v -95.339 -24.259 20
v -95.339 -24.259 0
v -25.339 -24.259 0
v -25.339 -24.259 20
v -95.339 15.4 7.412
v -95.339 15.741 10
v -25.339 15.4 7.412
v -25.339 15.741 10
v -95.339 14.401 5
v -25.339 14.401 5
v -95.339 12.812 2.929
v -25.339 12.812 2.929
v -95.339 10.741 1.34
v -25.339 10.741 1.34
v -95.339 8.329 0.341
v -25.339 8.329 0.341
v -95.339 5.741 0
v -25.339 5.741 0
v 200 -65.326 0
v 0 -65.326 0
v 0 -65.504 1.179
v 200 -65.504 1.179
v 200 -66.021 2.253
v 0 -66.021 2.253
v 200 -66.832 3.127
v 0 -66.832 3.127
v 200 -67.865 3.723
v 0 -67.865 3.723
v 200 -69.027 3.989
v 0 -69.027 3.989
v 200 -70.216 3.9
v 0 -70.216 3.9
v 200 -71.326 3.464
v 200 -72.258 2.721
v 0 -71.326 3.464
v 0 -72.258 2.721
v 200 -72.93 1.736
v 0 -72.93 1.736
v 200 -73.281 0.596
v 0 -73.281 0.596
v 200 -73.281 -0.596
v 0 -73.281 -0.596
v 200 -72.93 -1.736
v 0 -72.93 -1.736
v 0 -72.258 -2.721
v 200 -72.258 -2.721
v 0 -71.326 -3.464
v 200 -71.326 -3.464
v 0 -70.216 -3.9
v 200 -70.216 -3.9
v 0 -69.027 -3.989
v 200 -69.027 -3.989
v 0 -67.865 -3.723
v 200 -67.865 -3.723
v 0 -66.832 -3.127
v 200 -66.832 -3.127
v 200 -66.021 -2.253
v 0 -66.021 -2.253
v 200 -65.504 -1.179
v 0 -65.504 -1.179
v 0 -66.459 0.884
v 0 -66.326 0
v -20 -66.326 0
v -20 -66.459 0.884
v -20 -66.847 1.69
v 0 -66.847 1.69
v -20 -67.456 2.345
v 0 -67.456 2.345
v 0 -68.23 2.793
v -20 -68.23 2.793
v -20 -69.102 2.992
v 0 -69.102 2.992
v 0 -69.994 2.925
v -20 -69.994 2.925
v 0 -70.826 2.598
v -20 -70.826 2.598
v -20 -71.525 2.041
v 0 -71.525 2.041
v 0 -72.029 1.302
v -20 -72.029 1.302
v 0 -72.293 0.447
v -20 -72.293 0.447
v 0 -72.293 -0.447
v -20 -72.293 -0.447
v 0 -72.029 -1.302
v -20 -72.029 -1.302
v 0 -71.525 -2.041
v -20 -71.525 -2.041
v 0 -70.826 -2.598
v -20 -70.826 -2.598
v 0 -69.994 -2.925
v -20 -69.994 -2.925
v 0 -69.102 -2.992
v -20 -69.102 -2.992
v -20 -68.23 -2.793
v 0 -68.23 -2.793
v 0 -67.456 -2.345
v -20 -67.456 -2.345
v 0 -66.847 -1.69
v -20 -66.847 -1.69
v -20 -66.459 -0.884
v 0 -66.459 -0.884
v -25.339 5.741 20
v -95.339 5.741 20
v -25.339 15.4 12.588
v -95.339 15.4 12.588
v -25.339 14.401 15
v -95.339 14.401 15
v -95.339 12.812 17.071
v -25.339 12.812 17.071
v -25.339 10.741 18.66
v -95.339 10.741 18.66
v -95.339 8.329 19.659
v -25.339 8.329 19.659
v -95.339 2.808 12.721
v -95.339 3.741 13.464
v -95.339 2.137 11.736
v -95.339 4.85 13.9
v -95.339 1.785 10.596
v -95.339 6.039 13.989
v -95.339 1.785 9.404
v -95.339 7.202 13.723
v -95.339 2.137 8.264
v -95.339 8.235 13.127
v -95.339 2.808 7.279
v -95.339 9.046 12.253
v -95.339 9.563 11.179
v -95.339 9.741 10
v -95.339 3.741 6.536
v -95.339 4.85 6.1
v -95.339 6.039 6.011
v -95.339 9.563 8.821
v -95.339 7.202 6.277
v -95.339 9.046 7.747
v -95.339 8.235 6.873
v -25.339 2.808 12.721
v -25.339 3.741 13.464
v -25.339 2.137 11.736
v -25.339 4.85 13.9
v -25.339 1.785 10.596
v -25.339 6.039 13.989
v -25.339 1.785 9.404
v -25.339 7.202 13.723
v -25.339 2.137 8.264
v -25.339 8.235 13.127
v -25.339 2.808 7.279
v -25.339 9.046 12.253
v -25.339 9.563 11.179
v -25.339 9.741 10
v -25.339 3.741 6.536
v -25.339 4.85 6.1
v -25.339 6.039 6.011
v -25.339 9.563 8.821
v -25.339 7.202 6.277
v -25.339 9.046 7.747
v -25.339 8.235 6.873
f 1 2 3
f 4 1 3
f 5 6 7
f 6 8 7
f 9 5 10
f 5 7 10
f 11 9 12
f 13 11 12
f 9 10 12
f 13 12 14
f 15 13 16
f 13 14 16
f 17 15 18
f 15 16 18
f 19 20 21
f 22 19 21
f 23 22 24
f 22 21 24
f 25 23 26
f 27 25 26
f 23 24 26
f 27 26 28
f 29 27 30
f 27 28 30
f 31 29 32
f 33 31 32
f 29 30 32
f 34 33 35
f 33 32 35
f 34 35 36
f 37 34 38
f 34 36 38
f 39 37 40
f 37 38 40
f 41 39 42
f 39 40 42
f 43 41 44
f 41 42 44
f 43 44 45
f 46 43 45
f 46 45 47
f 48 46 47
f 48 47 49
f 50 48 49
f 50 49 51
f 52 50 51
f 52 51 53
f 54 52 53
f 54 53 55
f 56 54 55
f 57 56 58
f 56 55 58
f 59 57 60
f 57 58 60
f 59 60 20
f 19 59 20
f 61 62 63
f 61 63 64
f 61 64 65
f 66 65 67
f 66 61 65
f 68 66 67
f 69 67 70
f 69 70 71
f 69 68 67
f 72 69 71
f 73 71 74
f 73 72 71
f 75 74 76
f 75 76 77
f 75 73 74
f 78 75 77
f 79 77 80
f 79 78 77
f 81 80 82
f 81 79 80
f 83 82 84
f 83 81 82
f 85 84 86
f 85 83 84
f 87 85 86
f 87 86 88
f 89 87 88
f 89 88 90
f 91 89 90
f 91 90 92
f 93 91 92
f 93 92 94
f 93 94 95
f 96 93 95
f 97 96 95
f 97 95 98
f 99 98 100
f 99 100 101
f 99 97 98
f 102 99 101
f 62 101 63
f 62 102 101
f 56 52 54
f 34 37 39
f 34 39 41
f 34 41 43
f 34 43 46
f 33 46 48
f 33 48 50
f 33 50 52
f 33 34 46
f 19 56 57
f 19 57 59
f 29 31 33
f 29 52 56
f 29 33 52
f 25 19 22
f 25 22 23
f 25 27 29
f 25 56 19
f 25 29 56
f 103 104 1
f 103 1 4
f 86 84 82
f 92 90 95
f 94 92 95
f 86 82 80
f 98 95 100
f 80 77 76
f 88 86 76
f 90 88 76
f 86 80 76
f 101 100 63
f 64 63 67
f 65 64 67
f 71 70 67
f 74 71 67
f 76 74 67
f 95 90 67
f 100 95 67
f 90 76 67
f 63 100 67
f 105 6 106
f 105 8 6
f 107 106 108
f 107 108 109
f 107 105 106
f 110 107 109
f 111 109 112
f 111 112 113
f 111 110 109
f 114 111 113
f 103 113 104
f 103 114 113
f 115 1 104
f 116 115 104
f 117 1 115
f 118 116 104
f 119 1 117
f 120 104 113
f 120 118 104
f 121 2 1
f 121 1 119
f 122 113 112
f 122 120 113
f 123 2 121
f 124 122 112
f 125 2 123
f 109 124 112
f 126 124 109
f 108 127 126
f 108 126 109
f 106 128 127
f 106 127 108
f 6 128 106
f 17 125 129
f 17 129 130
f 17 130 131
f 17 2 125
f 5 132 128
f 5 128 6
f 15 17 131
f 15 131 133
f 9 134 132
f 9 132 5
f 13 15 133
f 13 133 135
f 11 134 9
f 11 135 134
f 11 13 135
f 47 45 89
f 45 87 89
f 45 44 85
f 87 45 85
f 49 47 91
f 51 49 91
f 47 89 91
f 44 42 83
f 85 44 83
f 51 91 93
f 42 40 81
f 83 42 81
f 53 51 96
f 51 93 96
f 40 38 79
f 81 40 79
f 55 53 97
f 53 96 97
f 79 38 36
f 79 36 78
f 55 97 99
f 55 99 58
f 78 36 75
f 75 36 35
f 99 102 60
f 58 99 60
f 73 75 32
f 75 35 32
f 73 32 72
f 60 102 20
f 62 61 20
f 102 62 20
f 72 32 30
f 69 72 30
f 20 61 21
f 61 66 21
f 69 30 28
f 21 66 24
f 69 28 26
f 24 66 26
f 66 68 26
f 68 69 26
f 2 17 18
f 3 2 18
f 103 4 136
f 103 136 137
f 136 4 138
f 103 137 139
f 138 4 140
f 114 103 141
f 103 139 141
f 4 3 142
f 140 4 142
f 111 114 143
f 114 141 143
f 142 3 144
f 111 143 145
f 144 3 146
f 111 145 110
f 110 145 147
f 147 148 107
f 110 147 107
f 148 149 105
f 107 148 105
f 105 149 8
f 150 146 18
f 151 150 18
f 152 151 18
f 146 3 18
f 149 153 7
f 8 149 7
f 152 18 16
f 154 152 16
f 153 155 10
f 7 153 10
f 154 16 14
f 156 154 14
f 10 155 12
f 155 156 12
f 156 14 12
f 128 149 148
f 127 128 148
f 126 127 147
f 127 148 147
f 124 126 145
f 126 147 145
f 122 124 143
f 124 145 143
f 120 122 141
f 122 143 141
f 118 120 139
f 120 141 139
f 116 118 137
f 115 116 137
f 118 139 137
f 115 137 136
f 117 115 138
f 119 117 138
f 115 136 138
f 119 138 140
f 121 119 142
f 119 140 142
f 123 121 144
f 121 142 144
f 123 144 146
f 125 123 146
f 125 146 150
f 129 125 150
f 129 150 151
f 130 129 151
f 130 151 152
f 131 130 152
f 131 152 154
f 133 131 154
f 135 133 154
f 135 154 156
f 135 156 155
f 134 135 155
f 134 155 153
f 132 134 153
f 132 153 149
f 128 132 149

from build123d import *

# Parameters (mm, degrees)
F0_R      = 3
F1_DEPTH  = 20
F0_R_2    = 4
F1_FACE_R = 3
F2_DEPTH  = 200
F3_W      = 70
F3_H      = 40
F4_DEPTH  = 20
F5_R      = 9.99999
F6_R      = 4
F7_DEPTH  = 70.001


# Not quite as in the source:
# - a fillet or chamfer is up to 0.001 mm smaller than in the source, because OpenCascade refuses the exact size


with BuildPart() as f1:
    # F0 (on Right) → F1 (new body)
    with BuildSketch(Plane.YZ):
        with Locations((-69.3261250854, 0)):
            Circle(F0_R)
    extrude(amount=-F1_DEPTH)

    # F0 (on Right) + F1_face (on face) → F2 (join)
    with BuildSketch(Plane.YZ):
        with Locations((-69.3261250854, 0)):
            Circle(F0_R_2)
        with Locations((-69.3261250854, 0)):
            Circle(F0_R, mode=Mode.SUBTRACT)
    with BuildSketch(Plane(origin=(0, -69.3261250854, 0), x_dir=(0, 1, 0), z_dir=(1, 0, 0))):
        Circle(F1_FACE_R)
    extrude(amount=F2_DEPTH)


with BuildPart() as f4:
    # F3 (on Top) → F4 (new body)
    with BuildSketch(Plane.XY):
        with Locations((-60.3385819857, -4.25943546)):
            Rectangle(F3_W, F3_H)
    extrude(amount=F4_DEPTH)

    # F5 (radius 10 in the source; OpenCascade refuses exactly that, so slightly less here)
    f5_edges = [f4.edges().sort_by_distance(p)[0] for p in [
        (-60.338582, 15.740565, 20),
        (-60.338582, 15.740565, 0),
    ]]
    fillet(f5_edges, radius=F5_R)

    # F6 (on face) → F7 (cut, through all)
    with BuildSketch(Plane.YZ.offset(-25.3385819857)):
        with Locations((5.74056454, 10)):
            Circle(F6_R)
    extrude(amount=-F7_DEPTH, mode=Mode.SUBTRACT)


solid = Compound([f1.part, f4.part])
